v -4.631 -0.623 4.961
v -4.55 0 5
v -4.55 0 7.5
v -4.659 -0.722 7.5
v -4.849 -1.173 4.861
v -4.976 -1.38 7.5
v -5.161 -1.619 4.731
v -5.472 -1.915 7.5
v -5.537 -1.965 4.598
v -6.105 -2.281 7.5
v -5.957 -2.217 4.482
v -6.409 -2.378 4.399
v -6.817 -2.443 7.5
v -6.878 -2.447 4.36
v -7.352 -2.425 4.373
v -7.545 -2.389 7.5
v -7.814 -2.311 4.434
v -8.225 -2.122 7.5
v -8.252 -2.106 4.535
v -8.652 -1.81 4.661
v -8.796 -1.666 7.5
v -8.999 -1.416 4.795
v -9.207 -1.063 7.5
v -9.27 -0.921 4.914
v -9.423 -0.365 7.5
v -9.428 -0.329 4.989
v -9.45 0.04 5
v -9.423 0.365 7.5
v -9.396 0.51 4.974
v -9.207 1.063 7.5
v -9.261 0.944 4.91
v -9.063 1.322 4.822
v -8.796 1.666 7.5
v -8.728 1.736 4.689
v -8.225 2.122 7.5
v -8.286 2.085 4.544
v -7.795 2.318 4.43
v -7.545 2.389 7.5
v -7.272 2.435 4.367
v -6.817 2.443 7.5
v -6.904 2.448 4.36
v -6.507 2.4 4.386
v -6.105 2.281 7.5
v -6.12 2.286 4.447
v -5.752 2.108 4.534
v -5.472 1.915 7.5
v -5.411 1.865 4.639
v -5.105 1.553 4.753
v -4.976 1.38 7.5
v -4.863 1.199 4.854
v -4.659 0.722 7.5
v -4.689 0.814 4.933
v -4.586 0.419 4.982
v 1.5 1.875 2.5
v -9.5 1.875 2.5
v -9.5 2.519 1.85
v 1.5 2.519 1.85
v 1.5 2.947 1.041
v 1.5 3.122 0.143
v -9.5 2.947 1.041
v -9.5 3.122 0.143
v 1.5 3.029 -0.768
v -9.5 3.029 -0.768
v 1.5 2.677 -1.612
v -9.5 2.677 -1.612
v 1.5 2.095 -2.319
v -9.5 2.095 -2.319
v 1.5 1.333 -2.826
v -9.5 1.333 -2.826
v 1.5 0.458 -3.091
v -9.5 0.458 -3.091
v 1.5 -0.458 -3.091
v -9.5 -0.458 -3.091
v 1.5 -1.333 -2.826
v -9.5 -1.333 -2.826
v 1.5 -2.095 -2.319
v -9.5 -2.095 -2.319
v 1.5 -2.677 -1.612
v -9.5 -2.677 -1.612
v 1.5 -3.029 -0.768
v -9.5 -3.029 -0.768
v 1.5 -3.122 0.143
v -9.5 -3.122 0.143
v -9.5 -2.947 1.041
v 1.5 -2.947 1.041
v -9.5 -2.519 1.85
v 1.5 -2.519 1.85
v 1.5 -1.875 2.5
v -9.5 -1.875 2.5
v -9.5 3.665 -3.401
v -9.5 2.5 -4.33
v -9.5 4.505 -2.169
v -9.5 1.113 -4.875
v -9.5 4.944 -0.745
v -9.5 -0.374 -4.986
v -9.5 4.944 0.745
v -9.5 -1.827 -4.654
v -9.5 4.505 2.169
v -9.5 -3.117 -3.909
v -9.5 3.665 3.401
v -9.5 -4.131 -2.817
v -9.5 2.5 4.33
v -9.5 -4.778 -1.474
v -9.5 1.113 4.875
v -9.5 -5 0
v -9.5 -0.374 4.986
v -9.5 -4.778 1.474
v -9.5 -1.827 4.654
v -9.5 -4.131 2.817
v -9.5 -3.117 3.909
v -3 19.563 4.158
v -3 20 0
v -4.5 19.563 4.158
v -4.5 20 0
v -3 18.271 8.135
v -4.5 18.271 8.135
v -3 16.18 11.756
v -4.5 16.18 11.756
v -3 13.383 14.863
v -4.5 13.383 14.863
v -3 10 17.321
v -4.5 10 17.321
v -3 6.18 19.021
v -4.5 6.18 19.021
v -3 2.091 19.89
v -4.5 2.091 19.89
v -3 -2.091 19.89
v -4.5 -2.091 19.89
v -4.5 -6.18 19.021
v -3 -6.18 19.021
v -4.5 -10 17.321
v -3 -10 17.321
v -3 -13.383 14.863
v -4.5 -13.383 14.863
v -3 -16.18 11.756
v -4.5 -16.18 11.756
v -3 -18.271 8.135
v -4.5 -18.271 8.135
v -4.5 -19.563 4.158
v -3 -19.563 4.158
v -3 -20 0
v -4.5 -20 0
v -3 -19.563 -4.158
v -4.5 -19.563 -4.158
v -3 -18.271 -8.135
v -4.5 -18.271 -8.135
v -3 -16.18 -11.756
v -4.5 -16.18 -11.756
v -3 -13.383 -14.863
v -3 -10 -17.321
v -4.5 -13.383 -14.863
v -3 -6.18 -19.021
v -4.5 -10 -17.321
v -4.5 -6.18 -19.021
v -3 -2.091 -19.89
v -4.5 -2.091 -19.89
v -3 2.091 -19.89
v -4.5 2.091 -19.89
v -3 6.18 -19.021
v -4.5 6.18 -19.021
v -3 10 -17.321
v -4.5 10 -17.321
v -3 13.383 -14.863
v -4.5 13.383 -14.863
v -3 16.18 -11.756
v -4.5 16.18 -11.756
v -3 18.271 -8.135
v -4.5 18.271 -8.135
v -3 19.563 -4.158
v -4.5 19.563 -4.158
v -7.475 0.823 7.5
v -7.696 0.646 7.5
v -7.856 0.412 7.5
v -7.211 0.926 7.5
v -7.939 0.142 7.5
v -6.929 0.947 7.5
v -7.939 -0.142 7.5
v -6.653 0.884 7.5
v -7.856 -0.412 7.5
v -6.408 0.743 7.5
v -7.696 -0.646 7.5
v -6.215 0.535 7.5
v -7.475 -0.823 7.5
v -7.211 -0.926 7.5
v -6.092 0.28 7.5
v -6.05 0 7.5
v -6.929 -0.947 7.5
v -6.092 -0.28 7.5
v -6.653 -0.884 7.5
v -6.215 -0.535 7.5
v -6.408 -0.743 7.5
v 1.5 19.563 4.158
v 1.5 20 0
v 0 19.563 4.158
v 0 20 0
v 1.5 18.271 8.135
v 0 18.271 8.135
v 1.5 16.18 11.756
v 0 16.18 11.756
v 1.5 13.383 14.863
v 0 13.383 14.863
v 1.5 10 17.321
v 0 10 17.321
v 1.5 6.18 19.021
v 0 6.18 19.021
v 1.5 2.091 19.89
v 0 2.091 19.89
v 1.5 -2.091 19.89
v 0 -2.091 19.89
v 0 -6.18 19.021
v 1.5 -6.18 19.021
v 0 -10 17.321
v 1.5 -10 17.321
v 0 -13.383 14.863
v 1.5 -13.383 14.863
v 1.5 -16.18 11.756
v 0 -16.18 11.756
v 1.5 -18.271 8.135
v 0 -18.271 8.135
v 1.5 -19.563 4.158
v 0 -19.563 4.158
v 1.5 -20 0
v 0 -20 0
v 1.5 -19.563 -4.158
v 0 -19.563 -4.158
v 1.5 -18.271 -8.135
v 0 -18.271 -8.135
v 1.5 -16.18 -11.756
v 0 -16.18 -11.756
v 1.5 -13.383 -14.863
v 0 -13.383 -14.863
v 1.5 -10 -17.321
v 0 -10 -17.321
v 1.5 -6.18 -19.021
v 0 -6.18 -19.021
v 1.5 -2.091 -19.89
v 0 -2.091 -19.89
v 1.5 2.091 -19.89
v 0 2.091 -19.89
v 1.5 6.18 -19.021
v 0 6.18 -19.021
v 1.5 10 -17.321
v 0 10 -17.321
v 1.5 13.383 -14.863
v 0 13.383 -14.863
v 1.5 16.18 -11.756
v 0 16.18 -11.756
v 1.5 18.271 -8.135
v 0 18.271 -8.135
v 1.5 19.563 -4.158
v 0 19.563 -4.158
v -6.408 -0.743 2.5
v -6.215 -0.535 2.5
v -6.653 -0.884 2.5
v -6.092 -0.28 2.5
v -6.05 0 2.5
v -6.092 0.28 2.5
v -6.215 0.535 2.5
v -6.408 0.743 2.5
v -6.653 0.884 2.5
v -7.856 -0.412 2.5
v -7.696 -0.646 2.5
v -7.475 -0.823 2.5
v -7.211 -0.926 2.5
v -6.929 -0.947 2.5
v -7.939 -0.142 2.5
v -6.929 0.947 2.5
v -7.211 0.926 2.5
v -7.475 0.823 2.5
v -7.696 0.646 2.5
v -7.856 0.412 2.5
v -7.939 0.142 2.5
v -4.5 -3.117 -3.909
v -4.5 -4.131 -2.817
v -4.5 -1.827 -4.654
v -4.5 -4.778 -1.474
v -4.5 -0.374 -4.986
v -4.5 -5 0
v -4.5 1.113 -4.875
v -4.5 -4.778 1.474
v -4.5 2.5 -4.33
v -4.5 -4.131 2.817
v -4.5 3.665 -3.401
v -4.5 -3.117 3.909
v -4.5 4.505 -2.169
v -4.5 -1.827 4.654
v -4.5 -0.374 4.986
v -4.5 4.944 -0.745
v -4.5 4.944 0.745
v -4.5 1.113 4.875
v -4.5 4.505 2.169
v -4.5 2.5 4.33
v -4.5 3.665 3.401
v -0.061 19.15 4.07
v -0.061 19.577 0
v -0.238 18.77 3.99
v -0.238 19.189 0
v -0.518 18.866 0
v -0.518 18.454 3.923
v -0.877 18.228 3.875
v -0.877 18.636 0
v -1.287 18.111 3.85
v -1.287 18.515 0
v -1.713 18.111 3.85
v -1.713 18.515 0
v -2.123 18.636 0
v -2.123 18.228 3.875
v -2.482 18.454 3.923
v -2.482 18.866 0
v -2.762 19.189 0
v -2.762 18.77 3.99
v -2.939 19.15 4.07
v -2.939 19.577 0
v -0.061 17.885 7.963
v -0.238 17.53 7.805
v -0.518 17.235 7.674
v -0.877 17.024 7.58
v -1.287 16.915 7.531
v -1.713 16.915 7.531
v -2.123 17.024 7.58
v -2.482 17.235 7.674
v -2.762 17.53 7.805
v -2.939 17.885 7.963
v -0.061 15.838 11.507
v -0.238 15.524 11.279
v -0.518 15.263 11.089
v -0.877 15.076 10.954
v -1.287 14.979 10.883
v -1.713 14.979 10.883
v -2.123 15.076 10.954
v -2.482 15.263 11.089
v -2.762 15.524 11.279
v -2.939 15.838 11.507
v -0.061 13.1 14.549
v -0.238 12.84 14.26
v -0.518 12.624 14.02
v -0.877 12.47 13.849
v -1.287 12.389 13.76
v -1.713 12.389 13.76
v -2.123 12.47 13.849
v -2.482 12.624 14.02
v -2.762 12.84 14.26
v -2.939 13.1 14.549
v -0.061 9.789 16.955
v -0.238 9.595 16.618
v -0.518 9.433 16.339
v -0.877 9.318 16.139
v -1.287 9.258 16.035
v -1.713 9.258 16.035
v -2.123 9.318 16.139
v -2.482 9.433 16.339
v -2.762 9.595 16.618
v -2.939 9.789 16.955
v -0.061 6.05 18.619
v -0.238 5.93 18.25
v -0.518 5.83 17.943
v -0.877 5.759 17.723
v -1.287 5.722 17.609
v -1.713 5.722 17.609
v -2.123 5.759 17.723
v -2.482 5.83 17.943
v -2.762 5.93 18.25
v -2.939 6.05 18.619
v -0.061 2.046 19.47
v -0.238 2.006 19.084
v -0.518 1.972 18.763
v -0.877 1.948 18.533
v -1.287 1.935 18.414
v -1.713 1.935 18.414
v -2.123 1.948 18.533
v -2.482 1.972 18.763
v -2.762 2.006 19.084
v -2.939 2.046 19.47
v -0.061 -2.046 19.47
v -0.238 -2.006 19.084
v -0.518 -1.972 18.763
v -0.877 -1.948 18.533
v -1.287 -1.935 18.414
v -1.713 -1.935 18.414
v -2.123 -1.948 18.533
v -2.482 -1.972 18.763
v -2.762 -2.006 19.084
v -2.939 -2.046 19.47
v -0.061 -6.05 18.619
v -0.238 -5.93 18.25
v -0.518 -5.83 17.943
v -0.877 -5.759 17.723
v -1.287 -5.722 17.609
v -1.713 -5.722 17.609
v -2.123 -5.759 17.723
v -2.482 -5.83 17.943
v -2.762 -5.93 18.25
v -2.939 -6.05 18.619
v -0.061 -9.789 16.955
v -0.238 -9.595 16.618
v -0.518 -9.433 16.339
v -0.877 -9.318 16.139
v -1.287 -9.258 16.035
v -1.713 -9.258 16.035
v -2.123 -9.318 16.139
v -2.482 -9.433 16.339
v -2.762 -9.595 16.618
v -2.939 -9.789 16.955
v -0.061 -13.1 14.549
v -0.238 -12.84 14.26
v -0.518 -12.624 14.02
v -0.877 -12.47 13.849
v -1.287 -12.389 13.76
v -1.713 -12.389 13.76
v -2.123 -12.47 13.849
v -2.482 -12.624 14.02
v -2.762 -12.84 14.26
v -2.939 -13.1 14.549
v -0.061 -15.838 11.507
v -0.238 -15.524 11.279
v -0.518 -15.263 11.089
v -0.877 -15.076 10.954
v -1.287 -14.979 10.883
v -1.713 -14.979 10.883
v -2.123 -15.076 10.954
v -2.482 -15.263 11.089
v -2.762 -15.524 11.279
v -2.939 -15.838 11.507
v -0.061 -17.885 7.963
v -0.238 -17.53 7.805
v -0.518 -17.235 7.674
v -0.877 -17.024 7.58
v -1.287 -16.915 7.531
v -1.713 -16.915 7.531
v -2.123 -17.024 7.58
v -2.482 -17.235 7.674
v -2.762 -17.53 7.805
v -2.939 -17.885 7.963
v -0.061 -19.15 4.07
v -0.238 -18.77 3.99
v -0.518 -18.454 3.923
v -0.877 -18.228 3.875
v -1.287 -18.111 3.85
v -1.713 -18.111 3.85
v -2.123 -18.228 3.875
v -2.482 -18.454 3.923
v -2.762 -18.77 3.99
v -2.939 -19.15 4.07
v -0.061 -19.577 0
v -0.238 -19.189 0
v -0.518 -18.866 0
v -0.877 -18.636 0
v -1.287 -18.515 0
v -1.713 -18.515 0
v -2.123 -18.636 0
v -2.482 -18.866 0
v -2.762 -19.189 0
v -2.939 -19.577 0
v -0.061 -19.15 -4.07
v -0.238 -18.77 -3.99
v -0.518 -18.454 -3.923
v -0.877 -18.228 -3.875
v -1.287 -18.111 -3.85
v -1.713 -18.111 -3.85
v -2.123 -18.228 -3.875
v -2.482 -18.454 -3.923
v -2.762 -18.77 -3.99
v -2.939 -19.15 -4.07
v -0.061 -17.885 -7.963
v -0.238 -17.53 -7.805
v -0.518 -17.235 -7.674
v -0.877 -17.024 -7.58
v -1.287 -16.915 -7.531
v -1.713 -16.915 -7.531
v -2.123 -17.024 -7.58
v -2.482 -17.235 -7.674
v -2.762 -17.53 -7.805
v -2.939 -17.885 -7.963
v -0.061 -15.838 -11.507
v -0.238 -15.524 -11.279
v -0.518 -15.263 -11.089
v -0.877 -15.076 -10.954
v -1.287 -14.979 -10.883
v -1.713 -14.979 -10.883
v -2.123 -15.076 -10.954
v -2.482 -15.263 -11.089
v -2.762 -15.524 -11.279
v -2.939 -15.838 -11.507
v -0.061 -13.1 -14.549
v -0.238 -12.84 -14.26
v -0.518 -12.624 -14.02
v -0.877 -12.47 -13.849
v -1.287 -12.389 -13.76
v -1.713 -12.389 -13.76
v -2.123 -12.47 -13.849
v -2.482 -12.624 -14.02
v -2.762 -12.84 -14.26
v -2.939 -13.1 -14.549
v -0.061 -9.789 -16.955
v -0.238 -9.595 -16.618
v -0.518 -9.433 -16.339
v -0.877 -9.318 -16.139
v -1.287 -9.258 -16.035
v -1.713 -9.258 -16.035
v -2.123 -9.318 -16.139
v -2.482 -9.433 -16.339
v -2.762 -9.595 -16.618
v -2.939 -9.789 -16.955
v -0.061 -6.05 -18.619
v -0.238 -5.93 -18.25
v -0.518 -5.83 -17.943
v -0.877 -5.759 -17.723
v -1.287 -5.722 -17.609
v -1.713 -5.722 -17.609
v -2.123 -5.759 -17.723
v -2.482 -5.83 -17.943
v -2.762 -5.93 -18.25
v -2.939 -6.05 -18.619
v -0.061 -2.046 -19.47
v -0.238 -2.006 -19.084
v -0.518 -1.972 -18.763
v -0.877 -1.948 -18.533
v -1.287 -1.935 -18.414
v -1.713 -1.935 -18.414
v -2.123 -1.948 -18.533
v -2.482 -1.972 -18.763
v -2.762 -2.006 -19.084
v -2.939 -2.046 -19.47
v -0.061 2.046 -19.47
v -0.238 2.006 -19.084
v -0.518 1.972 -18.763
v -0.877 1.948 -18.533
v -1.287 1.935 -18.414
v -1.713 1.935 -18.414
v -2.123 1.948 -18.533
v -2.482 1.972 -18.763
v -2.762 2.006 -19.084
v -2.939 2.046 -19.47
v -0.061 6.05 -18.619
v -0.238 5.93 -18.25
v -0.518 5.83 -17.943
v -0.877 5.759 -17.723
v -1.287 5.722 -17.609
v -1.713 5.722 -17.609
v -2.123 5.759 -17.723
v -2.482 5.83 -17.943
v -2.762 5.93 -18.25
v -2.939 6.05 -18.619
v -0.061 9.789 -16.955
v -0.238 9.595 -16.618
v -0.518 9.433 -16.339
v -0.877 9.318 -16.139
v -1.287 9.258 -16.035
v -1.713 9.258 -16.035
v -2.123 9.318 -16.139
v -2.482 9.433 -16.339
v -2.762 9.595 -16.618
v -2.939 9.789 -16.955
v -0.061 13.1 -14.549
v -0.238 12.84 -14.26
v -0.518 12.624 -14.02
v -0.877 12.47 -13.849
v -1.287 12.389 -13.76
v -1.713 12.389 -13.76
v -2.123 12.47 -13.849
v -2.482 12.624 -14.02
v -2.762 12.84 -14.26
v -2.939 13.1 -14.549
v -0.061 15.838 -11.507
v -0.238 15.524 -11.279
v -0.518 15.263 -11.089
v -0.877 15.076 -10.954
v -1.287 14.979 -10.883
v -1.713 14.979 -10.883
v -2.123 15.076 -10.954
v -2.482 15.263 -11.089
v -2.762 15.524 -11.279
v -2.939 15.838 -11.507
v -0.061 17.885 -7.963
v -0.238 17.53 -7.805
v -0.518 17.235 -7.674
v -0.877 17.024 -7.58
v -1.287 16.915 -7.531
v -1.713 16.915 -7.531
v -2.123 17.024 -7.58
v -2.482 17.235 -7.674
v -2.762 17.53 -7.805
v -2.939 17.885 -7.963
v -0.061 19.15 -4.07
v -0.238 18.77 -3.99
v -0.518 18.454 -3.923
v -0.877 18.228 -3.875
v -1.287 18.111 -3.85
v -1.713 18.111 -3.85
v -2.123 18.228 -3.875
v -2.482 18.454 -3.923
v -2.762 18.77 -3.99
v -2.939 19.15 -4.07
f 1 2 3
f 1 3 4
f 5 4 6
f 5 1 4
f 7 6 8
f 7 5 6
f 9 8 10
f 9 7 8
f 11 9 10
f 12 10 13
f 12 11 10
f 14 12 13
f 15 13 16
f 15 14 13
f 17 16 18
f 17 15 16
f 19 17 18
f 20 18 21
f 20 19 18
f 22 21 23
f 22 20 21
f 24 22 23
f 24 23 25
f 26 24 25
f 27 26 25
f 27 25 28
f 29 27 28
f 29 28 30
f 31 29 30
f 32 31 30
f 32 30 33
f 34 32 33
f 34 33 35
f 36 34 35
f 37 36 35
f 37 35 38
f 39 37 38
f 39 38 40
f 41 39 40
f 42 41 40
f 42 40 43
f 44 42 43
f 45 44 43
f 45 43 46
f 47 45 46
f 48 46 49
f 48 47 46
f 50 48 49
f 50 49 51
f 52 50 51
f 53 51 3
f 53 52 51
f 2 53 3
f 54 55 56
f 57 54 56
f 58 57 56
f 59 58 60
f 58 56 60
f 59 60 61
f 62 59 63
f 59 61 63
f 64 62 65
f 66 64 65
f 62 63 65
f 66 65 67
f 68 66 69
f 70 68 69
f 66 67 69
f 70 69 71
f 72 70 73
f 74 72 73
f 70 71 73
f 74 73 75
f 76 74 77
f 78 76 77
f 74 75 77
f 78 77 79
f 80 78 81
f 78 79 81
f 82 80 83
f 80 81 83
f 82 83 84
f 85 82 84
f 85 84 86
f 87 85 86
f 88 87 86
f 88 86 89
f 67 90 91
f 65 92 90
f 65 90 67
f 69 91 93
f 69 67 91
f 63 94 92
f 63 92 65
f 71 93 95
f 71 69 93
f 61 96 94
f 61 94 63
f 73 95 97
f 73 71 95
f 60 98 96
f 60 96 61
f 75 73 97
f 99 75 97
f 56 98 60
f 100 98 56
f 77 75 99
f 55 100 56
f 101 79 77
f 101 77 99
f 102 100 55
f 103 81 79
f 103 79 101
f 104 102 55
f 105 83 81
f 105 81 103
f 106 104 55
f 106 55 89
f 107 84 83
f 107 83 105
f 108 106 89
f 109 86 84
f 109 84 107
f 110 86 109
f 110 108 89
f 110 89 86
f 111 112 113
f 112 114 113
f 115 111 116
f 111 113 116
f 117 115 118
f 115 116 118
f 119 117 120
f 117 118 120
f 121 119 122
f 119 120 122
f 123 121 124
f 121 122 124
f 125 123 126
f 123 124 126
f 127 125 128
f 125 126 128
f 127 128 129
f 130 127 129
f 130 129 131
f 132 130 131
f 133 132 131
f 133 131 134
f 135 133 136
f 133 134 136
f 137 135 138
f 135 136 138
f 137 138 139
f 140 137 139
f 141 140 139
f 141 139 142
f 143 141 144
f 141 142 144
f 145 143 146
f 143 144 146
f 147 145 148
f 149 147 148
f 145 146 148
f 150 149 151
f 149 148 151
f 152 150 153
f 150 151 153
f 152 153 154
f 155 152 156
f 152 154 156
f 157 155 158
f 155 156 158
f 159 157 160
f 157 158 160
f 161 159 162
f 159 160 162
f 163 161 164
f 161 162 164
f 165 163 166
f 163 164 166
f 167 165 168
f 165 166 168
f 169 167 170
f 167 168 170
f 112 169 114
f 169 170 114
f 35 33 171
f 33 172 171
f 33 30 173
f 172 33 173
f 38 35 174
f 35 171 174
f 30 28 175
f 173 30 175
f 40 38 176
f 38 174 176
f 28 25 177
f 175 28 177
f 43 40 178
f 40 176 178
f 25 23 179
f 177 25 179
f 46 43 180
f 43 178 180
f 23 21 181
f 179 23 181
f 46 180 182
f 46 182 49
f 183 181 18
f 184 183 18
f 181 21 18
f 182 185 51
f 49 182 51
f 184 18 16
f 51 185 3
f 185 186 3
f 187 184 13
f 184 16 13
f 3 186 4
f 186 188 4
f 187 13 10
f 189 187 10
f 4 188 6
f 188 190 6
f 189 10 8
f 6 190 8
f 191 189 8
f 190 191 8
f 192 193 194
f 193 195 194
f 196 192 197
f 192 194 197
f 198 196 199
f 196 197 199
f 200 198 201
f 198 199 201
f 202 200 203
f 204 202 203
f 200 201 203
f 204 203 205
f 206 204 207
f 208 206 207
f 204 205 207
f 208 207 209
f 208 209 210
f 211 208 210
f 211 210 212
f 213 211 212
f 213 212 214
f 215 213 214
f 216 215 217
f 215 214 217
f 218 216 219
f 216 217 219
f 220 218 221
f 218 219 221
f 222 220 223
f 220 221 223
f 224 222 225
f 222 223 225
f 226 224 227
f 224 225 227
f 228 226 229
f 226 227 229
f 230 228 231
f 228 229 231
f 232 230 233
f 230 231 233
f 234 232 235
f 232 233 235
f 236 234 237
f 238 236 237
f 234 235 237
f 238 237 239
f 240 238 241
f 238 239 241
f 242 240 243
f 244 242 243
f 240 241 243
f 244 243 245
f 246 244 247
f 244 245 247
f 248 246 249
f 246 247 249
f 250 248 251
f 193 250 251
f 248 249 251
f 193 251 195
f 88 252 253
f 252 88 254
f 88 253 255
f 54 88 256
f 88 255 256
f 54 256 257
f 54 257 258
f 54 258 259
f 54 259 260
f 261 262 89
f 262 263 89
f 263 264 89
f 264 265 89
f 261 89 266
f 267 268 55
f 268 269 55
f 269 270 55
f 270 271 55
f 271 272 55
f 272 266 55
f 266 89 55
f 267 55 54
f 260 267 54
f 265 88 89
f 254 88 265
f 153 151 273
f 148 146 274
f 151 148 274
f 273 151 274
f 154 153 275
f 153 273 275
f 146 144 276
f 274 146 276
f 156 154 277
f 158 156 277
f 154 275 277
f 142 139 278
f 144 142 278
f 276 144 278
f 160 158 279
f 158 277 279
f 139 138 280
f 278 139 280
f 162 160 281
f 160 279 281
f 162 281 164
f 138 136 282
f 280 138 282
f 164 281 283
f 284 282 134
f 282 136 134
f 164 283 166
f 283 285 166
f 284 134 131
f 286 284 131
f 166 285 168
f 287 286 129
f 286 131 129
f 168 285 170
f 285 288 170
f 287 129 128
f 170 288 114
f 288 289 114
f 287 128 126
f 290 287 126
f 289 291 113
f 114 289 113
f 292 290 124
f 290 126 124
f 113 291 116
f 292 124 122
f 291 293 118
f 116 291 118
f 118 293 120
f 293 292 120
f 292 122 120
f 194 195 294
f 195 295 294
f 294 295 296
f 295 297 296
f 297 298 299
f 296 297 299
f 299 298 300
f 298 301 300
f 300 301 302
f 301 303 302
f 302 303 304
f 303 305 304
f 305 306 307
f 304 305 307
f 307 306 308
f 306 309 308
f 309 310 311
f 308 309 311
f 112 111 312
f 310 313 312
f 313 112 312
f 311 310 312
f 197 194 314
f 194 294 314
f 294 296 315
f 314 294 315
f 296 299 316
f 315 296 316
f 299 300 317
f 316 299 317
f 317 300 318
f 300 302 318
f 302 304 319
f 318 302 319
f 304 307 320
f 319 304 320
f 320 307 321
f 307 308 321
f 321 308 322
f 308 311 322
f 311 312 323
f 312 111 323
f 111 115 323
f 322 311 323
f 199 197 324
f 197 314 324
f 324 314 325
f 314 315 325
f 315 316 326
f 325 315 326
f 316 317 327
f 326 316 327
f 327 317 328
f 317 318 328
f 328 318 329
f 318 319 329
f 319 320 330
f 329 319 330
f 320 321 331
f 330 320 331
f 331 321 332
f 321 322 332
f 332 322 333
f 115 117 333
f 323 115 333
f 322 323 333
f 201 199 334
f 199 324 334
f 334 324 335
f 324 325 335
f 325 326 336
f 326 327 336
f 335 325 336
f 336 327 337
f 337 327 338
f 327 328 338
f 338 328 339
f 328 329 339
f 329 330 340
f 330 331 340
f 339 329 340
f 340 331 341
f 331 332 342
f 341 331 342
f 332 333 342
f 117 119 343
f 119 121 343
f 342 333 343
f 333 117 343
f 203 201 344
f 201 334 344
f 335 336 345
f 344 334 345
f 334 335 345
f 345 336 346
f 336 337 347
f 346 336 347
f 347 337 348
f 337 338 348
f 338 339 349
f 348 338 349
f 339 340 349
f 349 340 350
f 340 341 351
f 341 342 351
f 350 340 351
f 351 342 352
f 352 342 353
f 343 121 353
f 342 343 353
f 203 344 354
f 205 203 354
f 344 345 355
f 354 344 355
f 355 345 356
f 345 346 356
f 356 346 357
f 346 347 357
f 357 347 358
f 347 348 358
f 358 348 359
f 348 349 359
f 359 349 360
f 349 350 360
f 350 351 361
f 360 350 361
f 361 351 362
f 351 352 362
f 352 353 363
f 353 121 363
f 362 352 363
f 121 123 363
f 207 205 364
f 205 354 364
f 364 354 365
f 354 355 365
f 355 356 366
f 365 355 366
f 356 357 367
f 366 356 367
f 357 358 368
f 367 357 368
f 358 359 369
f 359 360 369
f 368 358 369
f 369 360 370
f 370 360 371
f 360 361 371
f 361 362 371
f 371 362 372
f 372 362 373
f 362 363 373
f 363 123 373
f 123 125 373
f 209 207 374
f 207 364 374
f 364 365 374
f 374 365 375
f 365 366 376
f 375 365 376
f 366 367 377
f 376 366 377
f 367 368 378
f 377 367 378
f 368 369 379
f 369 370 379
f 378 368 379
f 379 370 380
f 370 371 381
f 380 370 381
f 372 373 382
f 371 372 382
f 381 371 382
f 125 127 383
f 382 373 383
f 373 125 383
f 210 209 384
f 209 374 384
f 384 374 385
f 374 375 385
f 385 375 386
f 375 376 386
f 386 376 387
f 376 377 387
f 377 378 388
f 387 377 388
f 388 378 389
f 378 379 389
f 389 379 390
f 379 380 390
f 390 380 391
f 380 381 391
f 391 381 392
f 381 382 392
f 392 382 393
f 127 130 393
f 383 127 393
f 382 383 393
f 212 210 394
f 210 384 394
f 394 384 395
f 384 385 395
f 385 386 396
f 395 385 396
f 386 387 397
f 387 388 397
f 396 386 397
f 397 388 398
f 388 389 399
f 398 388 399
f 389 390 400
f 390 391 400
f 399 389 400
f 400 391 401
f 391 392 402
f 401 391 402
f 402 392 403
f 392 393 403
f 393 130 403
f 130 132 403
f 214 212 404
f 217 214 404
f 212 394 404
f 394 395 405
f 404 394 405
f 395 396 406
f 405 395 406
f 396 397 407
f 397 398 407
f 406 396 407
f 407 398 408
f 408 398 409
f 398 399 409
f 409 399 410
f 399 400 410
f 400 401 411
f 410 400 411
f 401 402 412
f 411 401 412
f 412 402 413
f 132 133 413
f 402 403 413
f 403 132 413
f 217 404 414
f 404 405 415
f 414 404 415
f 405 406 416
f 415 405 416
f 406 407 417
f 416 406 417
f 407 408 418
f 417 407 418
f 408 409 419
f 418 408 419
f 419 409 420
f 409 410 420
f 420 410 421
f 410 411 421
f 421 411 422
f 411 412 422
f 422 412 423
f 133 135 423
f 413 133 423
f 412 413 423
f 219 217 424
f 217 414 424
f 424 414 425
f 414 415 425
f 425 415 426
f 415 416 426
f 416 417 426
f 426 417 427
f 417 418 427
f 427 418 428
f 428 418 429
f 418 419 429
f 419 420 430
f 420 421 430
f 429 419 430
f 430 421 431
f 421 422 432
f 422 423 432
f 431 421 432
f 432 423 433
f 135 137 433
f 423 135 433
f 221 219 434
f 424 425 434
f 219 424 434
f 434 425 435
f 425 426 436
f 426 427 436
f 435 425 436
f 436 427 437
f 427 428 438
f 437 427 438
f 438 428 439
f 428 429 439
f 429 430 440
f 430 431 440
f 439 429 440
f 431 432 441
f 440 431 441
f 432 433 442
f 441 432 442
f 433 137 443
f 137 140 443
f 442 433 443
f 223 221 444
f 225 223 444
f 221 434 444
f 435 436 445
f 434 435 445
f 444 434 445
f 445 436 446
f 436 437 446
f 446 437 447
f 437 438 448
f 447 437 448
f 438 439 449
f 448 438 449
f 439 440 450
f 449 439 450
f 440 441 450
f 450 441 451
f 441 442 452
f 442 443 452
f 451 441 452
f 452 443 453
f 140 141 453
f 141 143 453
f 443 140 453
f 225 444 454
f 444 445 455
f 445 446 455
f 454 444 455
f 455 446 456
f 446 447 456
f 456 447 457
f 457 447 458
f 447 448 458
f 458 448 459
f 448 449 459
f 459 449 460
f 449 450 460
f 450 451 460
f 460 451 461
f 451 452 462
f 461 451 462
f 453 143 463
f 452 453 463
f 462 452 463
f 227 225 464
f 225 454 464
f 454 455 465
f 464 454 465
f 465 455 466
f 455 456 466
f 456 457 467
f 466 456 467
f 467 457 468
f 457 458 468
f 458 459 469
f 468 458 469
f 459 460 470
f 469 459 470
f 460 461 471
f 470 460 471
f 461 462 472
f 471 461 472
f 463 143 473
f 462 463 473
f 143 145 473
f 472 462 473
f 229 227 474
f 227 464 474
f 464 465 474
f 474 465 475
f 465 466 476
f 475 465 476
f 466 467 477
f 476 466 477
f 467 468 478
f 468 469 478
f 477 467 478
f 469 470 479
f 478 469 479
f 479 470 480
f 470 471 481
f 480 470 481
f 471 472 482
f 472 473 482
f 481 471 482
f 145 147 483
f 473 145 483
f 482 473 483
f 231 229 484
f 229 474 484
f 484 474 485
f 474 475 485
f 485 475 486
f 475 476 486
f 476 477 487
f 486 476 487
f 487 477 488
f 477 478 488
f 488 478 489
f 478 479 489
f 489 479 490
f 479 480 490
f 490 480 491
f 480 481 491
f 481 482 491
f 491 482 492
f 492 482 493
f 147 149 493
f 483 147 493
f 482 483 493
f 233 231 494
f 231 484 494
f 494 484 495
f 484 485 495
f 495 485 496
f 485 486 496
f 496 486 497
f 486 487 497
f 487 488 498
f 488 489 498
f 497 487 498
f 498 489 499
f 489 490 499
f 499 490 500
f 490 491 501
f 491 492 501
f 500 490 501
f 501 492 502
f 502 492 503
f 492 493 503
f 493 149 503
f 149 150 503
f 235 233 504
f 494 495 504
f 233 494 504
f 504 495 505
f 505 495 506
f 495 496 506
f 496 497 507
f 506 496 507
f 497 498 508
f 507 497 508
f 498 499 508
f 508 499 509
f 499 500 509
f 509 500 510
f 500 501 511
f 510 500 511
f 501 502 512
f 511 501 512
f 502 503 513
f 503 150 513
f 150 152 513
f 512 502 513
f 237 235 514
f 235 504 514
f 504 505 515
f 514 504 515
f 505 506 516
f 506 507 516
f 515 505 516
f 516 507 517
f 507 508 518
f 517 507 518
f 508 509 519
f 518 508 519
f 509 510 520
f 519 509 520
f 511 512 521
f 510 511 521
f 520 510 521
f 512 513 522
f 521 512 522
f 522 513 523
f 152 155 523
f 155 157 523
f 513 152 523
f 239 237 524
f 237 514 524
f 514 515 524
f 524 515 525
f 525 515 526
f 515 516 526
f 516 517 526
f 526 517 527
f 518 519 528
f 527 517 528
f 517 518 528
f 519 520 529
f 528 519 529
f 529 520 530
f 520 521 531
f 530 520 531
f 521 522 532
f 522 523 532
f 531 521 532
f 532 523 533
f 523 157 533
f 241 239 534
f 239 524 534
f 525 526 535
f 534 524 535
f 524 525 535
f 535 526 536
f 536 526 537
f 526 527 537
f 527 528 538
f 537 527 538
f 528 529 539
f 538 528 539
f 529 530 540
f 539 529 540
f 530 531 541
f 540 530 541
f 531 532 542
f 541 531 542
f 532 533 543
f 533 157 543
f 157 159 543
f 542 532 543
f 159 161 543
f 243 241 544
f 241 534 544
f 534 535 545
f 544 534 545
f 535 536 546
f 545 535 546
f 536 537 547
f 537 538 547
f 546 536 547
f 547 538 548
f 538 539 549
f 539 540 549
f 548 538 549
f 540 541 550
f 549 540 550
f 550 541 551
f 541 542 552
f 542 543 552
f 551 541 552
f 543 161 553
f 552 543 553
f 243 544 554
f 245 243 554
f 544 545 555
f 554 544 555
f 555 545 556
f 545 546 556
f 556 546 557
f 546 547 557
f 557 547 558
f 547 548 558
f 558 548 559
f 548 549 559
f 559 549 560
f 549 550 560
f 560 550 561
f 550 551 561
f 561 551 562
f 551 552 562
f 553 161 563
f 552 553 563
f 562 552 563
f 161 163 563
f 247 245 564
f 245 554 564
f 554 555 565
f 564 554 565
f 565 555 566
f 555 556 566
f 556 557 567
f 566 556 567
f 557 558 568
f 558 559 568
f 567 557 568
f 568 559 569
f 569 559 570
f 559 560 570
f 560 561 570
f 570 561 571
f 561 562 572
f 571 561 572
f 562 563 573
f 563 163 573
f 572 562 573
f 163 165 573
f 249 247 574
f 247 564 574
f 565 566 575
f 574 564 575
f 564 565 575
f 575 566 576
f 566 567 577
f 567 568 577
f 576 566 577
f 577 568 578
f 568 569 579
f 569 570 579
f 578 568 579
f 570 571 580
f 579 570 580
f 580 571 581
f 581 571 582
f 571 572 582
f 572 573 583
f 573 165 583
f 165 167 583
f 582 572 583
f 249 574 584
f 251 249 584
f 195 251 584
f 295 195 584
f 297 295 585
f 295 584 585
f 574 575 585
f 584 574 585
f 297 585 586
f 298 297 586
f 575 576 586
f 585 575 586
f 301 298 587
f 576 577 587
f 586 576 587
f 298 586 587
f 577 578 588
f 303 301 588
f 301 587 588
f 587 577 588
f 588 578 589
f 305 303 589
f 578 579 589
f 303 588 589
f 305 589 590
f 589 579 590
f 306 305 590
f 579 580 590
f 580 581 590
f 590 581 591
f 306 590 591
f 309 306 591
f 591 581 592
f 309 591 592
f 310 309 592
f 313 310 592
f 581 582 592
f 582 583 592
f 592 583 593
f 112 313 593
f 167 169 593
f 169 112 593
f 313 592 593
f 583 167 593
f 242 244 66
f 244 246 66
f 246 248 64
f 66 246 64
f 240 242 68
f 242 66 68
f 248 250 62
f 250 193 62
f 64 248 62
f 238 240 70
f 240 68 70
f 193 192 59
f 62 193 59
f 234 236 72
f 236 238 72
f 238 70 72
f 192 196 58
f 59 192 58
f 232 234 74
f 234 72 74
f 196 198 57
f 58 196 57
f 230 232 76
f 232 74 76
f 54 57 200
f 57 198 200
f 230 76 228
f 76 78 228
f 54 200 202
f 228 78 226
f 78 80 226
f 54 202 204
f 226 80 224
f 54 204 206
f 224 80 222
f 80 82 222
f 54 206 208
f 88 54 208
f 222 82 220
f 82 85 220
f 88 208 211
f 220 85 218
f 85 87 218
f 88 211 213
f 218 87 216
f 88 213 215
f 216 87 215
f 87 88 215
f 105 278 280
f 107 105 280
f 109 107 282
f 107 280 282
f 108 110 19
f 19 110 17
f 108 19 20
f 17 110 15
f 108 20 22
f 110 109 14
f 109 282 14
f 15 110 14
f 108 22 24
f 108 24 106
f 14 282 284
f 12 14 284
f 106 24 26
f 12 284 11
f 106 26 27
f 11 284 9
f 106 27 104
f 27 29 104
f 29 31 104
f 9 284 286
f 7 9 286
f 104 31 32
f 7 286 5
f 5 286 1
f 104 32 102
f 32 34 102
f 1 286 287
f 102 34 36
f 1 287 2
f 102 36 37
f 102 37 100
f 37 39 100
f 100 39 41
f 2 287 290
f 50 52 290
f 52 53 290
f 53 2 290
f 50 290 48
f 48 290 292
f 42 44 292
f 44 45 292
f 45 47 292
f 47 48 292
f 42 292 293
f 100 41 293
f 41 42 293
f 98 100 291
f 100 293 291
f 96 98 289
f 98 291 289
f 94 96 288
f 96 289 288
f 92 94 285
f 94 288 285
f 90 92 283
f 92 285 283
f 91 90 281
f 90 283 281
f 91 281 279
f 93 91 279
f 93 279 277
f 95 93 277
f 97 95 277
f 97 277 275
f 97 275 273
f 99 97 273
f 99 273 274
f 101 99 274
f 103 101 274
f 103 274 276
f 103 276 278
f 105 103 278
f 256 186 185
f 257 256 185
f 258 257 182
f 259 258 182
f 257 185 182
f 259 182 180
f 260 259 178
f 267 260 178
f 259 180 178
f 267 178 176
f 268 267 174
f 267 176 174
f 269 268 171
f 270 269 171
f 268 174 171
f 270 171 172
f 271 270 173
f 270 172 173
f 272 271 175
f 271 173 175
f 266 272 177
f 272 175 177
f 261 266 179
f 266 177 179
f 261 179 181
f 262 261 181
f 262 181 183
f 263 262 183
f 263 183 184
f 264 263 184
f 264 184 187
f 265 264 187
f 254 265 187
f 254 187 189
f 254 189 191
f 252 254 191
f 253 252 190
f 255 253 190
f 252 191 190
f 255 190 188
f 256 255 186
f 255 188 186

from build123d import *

# Parameters (mm, degrees)
F3_R      = 5
F4_DEPTH  = 5
F7_DEPTH  = 11
F9_R      = 2.45
F10_DEPTH = 5
F12_R     = 0.95
F13_DEPTH = 5


# Not quite as in the source:
# - ends of sketch curves that miss each other by under 0.0002 mm in the source are joined


with BuildPart() as f1:
    # F0 (on Top) → F1 (revolve)
    with BuildSketch(Plane.XY):
        with BuildLine():
            Line((-4.5, 0), (1.5, 0))
            Line((1.5, 0), (1.5, 20))
            Line((1.5, 20), (0, 20))
            ThreePointArc((0, 20), (-1.5, 18.4999958554), (-3.0000041446, 20))
            Line((-3.0000041446, 20), (-4.5, 20))
            Line((-4.5, 20), (-4.5, 0))
        make_face()
    revolve(axis=Axis((-1.5, 0, 0), (1, 0, 0)))

    # F3 (on offset) → F4 (join)
    with BuildSketch(Plane(origin=(-4.5, 0, 0), x_dir=(0, -1, 0), z_dir=(-1, 0, 0))):
        Circle(F3_R)
    extrude(amount=F4_DEPTH)

    # F6 (on offset) → F7 (cut, through all)
    with BuildSketch(Plane(origin=(-9.5, 0, 0), x_dir=(0, -1, 0), z_dir=(-1, 0, 0))):
        with BuildLine():
            Line((1.875, 2.5), (-1.875, 2.5))
            ThreePointArc((-1.875, 2.5), (0, -3.125), (1.875, 2.5))
        make_face()
    extrude(amount=-F7_DEPTH, mode=Mode.SUBTRACT)

    # F9 (on offset) → F10 (join)
    with BuildSketch(Plane(origin=(0, 0, 2.5), x_dir=(1, 0, 0), z_dir=(0, 0, -1))):
        with Locations((-7, 0)):
            Circle(F9_R)
    extrude(amount=-F10_DEPTH)

    # F12 (on offset) → F13 (cut, through all)
    with BuildSketch(Plane.XY.offset(7.5)):
        with Locations((-7, 0)):
            Circle(F12_R)
    extrude(amount=-F13_DEPTH, mode=Mode.SUBTRACT)


solid = f1.part
